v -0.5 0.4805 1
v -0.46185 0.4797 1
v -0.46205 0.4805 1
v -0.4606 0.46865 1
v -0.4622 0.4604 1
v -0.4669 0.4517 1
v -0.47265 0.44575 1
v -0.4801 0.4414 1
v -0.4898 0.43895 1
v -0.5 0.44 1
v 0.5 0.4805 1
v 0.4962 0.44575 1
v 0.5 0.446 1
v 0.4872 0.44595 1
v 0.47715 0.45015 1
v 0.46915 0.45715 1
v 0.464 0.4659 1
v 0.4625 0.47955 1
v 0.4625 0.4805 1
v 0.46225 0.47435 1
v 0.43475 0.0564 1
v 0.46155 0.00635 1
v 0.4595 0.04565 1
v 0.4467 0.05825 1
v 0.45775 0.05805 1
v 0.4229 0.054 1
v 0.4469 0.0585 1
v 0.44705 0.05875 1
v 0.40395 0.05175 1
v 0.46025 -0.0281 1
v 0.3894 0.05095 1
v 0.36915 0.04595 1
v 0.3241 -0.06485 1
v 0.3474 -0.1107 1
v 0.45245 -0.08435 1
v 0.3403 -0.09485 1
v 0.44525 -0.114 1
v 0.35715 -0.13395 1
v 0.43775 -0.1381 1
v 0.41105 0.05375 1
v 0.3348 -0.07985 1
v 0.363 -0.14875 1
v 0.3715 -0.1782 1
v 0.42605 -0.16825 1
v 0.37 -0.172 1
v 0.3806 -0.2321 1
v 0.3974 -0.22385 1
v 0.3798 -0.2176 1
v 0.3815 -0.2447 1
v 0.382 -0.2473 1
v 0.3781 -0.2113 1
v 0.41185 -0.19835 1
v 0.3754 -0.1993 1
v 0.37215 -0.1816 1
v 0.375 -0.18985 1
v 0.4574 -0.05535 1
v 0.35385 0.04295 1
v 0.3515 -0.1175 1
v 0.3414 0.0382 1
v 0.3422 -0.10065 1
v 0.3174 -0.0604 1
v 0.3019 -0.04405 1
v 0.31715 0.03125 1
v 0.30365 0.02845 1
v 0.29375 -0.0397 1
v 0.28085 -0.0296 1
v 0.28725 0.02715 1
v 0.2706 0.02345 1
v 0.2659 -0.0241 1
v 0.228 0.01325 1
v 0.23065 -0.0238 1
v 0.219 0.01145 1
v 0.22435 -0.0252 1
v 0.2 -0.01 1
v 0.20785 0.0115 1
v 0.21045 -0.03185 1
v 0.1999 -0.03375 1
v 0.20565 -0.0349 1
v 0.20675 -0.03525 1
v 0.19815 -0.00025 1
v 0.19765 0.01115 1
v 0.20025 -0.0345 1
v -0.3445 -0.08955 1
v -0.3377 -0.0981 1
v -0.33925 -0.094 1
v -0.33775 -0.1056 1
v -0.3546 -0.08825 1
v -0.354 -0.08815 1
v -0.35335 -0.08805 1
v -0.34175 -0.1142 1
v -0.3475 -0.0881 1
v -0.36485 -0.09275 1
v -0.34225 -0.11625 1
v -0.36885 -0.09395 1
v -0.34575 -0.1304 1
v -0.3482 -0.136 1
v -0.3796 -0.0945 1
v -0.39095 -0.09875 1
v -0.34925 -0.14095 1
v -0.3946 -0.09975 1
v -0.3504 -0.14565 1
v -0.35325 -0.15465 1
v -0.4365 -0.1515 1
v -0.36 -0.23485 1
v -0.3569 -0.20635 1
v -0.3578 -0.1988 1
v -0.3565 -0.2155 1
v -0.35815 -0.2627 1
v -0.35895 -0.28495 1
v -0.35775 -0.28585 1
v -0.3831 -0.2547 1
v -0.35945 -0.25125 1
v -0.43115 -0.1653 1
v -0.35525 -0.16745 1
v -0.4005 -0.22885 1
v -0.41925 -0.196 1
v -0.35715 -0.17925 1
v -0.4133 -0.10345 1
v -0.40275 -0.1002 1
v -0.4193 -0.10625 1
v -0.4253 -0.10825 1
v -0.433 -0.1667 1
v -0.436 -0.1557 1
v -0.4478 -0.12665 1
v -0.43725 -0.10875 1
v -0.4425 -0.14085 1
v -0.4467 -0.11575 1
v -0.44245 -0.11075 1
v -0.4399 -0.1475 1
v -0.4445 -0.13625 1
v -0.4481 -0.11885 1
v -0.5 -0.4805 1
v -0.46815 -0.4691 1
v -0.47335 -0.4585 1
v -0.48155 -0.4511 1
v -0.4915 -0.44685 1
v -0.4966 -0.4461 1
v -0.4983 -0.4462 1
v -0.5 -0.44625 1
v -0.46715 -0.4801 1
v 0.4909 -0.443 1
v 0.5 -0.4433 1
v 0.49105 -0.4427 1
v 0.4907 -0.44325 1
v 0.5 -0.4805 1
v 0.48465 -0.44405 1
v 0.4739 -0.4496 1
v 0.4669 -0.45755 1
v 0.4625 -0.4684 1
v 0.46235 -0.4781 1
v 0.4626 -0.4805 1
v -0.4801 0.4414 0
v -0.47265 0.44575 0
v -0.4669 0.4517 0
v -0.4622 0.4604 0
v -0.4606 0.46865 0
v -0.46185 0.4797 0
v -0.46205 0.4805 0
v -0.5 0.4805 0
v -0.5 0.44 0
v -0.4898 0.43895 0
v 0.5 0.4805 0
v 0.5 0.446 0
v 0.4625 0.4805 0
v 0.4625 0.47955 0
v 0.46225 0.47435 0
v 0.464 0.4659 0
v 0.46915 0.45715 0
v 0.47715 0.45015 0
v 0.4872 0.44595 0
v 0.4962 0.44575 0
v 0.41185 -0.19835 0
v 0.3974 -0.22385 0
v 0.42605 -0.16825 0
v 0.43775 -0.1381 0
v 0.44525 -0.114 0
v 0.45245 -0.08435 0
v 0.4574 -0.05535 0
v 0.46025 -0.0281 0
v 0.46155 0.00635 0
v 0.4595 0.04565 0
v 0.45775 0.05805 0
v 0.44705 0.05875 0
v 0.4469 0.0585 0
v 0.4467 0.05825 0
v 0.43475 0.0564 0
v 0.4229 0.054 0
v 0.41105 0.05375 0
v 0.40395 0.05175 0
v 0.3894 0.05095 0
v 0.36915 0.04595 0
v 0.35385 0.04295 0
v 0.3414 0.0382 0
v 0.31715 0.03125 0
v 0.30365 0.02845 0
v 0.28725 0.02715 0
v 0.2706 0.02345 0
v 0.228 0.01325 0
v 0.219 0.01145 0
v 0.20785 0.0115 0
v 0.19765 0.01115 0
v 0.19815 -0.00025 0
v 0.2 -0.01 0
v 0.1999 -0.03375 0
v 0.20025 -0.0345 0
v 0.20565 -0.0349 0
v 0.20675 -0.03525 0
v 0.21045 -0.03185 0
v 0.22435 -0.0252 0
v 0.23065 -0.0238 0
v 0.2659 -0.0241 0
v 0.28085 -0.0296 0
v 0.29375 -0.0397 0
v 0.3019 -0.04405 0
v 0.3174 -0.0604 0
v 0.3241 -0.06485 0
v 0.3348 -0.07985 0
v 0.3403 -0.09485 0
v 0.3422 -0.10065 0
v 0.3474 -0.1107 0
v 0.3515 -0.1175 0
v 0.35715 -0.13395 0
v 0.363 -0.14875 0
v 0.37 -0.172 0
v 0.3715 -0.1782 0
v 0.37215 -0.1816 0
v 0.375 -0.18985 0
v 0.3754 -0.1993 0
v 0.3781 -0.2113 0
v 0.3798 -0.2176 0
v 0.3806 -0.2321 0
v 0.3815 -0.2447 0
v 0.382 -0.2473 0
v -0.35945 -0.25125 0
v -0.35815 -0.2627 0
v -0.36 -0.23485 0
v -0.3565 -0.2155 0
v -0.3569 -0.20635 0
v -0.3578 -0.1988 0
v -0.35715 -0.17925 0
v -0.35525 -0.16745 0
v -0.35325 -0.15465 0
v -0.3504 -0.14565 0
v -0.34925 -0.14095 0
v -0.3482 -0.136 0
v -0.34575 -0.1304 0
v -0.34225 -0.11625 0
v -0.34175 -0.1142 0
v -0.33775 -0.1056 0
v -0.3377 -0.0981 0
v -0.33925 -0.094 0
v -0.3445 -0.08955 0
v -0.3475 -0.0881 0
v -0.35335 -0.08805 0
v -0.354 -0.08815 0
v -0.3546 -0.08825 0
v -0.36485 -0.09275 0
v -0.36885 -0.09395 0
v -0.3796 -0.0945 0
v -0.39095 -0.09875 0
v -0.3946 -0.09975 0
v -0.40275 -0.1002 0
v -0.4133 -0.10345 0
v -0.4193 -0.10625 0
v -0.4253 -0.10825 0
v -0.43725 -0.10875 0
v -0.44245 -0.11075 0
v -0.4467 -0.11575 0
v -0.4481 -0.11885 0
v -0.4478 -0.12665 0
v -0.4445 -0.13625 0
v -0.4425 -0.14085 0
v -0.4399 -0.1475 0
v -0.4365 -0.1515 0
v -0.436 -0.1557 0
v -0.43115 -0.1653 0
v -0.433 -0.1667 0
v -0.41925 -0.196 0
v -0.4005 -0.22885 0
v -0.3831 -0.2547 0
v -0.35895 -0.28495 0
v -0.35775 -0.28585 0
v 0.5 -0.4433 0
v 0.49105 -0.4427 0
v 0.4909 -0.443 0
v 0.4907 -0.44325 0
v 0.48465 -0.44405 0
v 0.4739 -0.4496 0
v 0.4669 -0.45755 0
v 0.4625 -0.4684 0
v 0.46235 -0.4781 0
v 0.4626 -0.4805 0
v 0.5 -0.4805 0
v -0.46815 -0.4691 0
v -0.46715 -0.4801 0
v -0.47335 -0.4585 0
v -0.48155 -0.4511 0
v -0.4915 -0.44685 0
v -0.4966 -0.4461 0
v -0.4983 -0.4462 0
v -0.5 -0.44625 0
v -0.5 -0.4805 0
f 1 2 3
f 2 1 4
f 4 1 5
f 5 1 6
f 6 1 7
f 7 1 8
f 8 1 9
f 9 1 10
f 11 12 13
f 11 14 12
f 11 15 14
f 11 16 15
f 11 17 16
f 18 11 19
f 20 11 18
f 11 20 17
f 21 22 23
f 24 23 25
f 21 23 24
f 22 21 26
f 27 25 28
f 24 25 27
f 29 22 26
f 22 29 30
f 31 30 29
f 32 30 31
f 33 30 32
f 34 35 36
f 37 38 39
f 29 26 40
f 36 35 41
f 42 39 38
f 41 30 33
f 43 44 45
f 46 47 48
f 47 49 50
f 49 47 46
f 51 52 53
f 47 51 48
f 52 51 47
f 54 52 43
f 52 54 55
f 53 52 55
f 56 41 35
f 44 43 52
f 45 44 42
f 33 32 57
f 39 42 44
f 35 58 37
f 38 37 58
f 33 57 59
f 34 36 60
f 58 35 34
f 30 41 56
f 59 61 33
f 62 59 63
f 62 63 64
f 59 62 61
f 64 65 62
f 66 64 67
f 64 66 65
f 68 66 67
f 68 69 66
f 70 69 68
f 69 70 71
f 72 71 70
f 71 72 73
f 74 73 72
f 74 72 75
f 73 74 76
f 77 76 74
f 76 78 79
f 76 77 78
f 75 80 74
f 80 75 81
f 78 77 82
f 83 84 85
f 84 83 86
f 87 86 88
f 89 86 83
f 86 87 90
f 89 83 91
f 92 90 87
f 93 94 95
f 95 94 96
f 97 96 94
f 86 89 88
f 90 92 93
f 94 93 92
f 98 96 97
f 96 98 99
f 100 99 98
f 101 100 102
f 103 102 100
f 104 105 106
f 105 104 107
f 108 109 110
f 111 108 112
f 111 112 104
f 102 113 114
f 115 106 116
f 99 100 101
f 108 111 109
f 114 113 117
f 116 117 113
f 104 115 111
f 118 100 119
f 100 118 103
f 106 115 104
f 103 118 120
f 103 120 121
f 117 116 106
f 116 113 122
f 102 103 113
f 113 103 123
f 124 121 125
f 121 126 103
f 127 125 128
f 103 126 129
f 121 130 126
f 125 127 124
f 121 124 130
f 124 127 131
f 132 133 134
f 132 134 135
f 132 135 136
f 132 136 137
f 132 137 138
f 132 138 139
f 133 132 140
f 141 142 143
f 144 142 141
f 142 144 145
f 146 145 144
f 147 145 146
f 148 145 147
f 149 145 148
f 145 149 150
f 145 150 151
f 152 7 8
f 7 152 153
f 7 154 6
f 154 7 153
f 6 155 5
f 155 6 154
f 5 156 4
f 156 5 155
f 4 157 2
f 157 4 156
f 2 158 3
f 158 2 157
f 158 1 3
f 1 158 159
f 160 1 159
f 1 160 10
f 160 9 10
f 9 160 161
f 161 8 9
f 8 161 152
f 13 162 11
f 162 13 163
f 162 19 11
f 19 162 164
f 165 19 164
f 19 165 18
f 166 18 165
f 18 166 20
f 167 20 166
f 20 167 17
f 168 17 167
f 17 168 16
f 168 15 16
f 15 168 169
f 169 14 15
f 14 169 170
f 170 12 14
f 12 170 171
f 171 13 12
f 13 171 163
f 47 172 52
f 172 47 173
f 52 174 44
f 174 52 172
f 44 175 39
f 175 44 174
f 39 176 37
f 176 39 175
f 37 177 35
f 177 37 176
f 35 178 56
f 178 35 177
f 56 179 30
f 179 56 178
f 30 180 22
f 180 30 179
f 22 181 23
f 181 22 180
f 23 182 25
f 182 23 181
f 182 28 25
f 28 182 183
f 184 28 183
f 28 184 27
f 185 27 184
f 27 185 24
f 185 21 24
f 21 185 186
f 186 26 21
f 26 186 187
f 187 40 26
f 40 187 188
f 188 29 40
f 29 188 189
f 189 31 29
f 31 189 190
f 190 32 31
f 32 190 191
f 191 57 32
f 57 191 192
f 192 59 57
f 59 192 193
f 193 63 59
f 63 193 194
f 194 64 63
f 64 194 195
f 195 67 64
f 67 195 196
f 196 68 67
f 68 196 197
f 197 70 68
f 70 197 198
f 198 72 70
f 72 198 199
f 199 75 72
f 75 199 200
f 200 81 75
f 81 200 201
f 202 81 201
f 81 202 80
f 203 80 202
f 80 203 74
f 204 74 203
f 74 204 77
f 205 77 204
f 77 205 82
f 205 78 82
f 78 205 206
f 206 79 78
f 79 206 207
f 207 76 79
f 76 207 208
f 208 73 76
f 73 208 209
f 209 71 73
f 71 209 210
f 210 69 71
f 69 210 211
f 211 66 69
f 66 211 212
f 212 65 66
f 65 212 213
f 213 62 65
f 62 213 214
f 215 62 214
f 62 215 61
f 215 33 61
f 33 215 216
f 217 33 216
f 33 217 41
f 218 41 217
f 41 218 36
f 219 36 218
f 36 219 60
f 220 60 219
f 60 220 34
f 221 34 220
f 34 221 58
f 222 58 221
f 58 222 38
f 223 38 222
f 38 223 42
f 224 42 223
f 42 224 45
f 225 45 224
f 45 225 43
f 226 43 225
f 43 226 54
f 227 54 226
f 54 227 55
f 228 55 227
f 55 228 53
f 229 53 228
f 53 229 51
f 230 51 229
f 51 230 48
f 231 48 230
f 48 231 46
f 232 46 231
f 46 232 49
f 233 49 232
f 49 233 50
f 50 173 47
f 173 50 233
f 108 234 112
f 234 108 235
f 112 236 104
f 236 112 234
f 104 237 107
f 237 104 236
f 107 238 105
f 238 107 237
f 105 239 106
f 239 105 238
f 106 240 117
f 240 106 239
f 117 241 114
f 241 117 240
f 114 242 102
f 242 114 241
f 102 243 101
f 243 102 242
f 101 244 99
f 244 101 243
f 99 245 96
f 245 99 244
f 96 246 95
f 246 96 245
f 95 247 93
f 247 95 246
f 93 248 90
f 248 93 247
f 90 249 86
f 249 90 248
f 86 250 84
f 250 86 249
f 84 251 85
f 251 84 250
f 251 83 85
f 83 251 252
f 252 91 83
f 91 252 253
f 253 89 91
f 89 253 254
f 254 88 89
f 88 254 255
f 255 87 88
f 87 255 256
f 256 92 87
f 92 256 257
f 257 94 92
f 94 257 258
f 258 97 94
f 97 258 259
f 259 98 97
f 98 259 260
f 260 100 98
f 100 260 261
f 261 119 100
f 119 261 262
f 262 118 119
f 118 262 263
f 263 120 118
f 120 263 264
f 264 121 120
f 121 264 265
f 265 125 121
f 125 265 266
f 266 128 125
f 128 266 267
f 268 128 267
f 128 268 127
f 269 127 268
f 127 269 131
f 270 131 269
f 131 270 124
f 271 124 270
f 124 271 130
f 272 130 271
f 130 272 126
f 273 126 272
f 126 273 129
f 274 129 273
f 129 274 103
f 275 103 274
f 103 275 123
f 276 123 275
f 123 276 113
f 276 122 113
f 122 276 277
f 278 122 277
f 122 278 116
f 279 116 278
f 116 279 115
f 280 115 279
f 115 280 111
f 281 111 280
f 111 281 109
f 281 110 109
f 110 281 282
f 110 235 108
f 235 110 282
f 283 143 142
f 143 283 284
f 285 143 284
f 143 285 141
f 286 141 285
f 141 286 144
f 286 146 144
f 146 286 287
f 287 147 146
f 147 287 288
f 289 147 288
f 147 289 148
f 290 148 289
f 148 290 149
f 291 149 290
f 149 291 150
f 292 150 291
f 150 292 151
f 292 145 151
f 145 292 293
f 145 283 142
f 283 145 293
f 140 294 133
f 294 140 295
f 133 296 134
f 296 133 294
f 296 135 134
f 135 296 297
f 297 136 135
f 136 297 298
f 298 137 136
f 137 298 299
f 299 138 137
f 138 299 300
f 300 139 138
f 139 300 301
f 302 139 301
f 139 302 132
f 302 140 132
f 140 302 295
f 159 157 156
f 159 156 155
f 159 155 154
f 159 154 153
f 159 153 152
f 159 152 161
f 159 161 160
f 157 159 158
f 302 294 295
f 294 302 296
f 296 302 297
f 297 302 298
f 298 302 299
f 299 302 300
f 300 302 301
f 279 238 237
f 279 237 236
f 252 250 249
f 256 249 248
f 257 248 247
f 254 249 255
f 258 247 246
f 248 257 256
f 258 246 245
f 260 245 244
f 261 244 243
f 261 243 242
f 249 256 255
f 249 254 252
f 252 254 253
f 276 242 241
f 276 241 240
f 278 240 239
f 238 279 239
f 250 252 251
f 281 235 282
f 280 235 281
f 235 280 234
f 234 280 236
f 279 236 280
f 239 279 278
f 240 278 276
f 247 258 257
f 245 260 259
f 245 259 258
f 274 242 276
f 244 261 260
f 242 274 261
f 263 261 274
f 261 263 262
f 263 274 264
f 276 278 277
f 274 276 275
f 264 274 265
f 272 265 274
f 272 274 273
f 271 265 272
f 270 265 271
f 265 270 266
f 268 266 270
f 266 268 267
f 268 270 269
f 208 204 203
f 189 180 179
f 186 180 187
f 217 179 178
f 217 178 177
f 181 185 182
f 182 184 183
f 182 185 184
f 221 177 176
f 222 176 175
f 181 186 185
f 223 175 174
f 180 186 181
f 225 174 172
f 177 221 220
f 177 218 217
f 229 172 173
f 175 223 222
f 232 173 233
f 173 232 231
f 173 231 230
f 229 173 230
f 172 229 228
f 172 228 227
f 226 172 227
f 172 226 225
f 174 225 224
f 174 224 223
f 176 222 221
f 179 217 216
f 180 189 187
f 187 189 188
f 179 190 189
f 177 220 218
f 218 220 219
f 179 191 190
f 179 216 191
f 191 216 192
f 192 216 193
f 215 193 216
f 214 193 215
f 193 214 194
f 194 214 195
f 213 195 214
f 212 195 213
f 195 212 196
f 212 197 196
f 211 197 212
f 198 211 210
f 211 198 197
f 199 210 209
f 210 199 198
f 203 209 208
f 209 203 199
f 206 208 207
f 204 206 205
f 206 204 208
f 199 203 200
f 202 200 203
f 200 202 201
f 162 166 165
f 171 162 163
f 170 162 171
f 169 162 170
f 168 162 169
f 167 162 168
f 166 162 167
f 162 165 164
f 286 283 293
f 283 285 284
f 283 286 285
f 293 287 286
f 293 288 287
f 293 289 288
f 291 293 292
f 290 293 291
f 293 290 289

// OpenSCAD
module Hedwig3green_1()
{
 /* Generated by trace2scad version 20150415
    http://aggregate.org/MAKE/TRACE2SCAD/
    Optimized model has 153/1378 original points
 */
 color([0.5, 0.5, 0.5])
 assign(minx=0) /* polygon minx=0 */
 assign(miny=0) /* polygon miny=0 */
 assign(maxx=20000) /* polygon maxx=20000 */
 assign(maxy=19220) /* polygon maxy=19220 */
 assign(dx=maxx-minx)
 assign(dy=maxy-miny)
 assign(maxd=((dx>dy)?dx:dy))
 scale([1/maxd, 1/maxd, 1])
 translate([-minx-dx/2, -miny-dy/2, 0])
 linear_extrude(height=1, convexity=153)
 union() {
  union() {
   polygon([[0,18815],[0,18410],[204,18389],[398,18438],[547,18525],[662,18644],[756,18818],[788,18983],[763,19204],[759,19220],[0,19220]], convexity=5);
   polygon([[19250,19210],[19250,19201],[19245,19097],[19280,18928],[19383,18753],[19543,18613],[19744,18529],[19924,18525],[20000,18530],[20000,19220],[19250,19220]], convexity=7);
   polygon([[18938,10780],[18934,10775],[18695,10738],[18458,10690],[18221,10685],[18079,10645],[17788,10629],[17383,10529],[17077,10469],[16828,10374],[16343,10235],[16073,10179],[15745,10153],[15412,10079],[14560,9875],[14380,9839],[14157,9840],[13953,9833],[13963,9605],[14000,9410],[13998,8935],[14005,8920],[14113,8912],[14135,8905],[14209,8973],[14487,9106],[14613,9134],[15318,9128],[15617,9018],[15875,8816],[16038,8729],[16348,8402],[16482,8313],[16696,8013],[16806,7713],[16844,7597],[16948,7396],[17030,7260],[17143,6931],[17260,6635],[17400,6170],[17430,6046],[17443,5978],[17500,5813],[17508,5624],[17562,5384],[17596,5258],[17612,4968],[17630,4716],[17640,4664],[17948,5133],[18237,5643],[18521,6245],[18755,6848],[18905,7330],[19049,7923],[19148,8503],[19205,9048],[19231,9737],[19190,10523],[19155,10771],[18941,10785]], convexity=12);
   polygon([[2920,7847],[2908,7845],[2703,7755],[2623,7731],[2408,7720],[2181,7635],[2108,7615],[1945,7606],[1734,7541],[1614,7485],[1494,7445],[1255,7435],[1151,7395],[1066,7295],[1038,7233],[1044,7077],[1110,6885],[1150,6793],[1202,6660],[1270,6580],[1280,6496],[1377,6304],[1340,6276],[1615,5690],[1990,5033],[2338,4516],[2821,3911],[2845,3893],[2837,4356],[2811,4585],[2800,4913],[2870,5300],[2862,5483],[2844,5634],[2857,6025],[2895,6261],[2935,6517],[2992,6697],[3015,6791],[3036,6890],[3085,7002],[3155,7285],[3165,7326],[3245,7498],[3246,7648],[3215,7730],[3110,7819],[3050,7848],[2933,7849]], convexity=11);
   polygon([[19818,750],[19814,745],[19693,729],[19478,618],[19338,459],[19250,242],[19247,48],[19252,0],[20000,0],[20000,744],[19821,756]], convexity=6);
   polygon([[34,686],[0,685],[0,0],[657,8],[637,228],[533,440],[369,588],[170,673],[68,688]], convexity=6);
  }
 }
}

module Hedwig3green()
{
 /* all layers combined, scaled to within a 1mm cube */
 scale([1, 1, 1/1])
 difference() {
  union() {
   scale([1,1,2]) translate([0,0,-0.5]) Hedwig3green_1();
  }
  translate([0,0,-2]) cube([2,2,4],center=true);
 }
}
Hedwig3green();
